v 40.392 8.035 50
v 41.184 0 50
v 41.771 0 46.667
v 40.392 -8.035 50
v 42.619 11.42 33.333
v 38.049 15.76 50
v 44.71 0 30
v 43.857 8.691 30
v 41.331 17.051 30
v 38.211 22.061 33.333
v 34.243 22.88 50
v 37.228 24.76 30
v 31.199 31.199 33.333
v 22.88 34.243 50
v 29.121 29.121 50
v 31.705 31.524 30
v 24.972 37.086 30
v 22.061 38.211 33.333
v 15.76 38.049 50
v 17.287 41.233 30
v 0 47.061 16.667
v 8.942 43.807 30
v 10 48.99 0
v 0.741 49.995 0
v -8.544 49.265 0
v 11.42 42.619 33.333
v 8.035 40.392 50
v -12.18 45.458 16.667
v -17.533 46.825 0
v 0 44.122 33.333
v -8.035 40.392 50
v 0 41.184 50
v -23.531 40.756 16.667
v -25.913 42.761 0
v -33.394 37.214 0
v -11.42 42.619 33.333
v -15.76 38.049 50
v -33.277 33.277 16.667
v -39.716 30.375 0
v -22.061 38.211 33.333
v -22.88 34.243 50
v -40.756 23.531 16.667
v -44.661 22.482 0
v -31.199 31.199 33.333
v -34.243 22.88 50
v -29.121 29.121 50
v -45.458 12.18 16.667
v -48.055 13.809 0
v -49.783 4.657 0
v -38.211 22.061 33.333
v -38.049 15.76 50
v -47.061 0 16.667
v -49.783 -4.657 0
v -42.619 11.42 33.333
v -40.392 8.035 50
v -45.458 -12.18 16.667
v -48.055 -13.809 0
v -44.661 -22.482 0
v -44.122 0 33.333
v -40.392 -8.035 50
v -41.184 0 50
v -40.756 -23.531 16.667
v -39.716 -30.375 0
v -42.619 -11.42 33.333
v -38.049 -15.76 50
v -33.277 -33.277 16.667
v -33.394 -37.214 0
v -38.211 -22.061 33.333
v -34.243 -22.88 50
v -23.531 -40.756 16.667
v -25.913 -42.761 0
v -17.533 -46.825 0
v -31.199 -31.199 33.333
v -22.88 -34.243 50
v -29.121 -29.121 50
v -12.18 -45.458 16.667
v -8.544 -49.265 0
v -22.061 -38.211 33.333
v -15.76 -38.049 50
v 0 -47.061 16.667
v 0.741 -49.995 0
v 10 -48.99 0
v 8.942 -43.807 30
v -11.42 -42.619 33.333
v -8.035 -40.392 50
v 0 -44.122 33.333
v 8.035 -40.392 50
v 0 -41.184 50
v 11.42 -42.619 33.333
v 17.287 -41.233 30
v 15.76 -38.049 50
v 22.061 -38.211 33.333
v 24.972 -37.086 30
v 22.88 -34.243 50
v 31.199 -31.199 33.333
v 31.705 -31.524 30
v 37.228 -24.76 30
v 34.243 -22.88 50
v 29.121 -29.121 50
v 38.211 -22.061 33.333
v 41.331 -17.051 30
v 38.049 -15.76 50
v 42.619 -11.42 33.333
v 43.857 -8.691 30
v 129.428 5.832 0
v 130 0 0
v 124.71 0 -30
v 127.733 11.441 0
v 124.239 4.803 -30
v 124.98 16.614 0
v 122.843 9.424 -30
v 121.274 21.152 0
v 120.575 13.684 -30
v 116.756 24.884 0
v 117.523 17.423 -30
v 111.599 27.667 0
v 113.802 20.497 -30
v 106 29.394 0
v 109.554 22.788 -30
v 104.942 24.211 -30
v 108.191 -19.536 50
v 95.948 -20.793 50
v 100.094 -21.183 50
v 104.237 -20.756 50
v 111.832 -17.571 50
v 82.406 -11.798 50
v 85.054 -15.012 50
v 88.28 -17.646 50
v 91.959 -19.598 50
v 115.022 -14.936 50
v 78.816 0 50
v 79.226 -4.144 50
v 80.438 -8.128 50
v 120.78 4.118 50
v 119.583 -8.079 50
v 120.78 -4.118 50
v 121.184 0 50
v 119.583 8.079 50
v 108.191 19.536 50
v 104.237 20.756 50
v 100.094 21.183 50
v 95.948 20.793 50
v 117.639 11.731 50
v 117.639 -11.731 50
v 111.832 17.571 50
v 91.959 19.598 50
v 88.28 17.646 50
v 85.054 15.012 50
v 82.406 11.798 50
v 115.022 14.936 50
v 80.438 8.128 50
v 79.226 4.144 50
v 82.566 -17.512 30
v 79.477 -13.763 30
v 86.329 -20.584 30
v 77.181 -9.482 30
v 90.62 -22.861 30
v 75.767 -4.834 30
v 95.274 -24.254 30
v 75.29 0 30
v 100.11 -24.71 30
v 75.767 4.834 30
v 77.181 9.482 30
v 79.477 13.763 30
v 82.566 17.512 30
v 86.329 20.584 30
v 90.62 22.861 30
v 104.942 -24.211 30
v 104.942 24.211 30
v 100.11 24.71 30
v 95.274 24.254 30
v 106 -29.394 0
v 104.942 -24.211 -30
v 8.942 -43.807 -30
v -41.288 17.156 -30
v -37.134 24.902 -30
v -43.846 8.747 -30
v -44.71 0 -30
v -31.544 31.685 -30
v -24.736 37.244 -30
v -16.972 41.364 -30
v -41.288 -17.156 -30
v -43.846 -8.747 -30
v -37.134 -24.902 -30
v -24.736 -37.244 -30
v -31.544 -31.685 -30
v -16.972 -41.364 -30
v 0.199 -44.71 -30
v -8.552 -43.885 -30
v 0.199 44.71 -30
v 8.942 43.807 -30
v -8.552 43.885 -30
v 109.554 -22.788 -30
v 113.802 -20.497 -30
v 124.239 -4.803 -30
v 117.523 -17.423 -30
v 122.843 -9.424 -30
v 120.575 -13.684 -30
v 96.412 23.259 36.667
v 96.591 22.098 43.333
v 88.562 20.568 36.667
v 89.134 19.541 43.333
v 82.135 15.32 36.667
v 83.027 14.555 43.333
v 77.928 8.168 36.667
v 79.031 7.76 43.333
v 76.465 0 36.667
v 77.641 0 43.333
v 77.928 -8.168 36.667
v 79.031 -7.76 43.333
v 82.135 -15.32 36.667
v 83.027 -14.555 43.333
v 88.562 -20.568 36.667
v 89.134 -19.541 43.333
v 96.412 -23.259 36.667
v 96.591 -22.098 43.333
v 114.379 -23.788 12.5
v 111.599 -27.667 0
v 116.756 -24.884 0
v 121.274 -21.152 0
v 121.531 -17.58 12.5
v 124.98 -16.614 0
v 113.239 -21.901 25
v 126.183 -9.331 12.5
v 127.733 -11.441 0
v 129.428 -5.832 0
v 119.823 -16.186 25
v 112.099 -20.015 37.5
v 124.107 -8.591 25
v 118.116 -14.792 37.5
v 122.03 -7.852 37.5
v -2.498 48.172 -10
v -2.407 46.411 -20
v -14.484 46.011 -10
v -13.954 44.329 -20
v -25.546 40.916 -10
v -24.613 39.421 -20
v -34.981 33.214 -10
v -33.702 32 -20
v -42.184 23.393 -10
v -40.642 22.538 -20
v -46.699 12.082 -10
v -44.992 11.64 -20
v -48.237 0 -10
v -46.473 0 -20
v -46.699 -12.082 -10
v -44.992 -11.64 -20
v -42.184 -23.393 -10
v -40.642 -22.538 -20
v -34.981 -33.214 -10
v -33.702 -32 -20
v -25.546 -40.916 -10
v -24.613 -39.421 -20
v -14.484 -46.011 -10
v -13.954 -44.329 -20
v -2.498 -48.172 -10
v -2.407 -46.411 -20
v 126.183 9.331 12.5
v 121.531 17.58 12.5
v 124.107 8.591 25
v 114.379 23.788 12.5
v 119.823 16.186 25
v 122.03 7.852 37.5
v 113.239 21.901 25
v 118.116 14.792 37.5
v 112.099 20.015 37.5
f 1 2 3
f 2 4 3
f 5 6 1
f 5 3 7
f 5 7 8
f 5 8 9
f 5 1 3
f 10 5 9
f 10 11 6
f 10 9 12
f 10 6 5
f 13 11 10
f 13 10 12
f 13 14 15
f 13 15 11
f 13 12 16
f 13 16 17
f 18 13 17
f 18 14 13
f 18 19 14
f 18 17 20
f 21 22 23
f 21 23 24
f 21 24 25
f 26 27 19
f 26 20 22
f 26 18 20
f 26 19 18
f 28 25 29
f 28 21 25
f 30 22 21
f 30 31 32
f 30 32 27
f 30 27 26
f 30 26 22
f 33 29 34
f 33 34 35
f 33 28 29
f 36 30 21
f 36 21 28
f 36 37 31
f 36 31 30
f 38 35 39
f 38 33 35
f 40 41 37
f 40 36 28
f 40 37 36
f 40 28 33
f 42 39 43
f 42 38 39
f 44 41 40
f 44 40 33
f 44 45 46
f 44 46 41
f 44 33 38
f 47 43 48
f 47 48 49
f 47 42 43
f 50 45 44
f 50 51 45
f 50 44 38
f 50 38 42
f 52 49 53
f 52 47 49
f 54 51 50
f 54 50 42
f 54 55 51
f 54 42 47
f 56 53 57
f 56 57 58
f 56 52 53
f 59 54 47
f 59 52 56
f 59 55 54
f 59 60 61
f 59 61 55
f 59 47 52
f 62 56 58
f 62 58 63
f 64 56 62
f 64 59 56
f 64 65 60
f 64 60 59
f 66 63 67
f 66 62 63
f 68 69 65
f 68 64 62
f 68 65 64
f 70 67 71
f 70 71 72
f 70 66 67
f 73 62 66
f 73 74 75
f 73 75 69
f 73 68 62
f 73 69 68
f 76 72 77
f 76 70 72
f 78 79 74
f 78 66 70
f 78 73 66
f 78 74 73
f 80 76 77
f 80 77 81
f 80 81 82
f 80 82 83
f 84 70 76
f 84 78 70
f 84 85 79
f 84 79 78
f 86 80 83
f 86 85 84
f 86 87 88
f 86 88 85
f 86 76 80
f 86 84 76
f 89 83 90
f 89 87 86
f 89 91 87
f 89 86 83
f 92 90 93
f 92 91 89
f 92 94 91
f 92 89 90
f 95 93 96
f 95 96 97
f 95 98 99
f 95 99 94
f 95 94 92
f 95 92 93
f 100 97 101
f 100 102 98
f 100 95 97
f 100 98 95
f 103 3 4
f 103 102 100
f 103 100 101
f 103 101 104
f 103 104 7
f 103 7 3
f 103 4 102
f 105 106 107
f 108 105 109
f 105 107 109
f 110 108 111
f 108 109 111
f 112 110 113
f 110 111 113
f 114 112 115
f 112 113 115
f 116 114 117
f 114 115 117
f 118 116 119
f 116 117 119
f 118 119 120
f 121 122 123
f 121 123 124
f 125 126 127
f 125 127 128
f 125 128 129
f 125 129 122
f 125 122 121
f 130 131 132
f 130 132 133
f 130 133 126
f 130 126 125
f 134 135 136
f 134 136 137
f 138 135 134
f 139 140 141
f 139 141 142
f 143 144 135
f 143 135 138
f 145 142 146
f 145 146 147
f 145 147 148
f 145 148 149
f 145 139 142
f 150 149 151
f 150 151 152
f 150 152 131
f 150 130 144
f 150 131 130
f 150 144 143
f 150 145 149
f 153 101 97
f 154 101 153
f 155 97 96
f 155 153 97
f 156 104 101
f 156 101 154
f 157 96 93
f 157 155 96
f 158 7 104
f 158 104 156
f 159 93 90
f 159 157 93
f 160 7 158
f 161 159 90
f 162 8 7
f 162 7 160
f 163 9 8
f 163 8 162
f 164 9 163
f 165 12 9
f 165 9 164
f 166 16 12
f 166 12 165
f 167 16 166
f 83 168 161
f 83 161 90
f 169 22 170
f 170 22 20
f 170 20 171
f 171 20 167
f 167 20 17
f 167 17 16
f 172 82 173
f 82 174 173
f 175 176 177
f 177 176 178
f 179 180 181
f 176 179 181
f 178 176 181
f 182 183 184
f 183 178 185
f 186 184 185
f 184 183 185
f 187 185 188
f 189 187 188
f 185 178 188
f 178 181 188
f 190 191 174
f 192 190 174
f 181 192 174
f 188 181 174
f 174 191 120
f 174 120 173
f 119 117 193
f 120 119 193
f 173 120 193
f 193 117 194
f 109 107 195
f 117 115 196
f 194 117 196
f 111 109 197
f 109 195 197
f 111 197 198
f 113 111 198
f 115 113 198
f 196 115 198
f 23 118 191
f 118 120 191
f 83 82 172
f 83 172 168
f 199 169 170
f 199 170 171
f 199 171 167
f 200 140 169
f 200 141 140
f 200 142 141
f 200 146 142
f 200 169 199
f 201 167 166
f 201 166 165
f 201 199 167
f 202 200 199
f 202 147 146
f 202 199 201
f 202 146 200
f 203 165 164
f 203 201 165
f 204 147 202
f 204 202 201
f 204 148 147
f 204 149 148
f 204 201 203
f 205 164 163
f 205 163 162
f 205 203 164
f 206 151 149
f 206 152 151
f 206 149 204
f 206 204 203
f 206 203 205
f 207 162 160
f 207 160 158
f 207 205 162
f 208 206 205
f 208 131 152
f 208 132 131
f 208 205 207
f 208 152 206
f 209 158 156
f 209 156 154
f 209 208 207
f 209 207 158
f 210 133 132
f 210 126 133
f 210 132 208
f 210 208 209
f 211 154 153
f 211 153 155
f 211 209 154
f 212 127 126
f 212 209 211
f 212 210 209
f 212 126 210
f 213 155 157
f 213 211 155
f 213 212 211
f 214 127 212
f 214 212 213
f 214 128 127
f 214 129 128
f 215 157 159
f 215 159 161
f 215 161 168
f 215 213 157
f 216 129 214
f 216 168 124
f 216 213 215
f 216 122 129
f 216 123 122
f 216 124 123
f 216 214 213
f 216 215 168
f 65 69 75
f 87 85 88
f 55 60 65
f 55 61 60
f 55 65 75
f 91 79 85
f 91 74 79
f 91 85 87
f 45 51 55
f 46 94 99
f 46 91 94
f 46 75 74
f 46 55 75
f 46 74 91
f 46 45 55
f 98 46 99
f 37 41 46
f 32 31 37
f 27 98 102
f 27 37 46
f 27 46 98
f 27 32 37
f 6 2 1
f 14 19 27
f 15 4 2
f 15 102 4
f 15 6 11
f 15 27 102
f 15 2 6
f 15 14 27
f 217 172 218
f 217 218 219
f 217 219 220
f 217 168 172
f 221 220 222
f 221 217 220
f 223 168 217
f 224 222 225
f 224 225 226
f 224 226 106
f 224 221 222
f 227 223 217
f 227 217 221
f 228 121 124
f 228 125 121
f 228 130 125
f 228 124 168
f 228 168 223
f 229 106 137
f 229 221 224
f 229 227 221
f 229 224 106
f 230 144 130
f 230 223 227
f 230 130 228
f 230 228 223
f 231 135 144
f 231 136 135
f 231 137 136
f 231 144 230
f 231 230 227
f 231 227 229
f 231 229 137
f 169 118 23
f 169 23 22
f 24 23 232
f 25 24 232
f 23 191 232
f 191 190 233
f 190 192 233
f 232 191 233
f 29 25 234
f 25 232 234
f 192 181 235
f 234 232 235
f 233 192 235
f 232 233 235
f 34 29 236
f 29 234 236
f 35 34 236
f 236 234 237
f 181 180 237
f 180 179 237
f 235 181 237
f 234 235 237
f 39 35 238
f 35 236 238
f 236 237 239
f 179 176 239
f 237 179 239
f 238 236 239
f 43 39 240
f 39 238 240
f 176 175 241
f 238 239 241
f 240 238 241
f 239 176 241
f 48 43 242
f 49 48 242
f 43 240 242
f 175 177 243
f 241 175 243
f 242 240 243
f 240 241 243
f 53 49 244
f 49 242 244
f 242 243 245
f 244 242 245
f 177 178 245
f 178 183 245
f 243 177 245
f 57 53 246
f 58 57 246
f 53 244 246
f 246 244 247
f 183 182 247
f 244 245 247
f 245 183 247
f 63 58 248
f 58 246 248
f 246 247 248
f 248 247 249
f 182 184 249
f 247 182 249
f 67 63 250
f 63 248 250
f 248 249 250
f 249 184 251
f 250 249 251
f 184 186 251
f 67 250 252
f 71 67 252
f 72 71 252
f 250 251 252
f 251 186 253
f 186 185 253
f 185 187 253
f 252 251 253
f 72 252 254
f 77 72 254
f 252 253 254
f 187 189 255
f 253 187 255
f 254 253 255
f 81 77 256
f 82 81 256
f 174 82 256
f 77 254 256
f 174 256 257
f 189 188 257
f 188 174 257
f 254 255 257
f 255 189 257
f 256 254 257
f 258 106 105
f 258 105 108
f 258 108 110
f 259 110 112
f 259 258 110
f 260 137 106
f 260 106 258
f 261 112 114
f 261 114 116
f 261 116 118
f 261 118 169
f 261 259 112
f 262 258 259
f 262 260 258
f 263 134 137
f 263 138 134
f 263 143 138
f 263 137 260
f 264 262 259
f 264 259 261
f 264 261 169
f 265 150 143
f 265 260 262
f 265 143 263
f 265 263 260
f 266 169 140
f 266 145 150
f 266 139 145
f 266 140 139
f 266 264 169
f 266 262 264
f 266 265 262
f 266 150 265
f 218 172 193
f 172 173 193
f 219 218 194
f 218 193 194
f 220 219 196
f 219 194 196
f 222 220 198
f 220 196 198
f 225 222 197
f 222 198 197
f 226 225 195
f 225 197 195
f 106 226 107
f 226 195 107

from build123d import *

# Parameters (mm, degrees)
F1_DEPTH = 50
F1_TAPER = 10
F2_DEPTH = 30
F2_TAPER = 10


with BuildPart() as f1:
    # F0 (on Top) → F1 (new body)
    with BuildSketch(Plane.XY):
        with BuildLine():
            ThreePointArc((10, -48.9897948557), (38.7298334621, -31.6227766017), (50, 0))
            ThreePointArc((50, 0), (38.7298334621, 31.6227766017), (10, 48.9897948557))
            ThreePointArc((10, 48.9897948557), (-50, 0), (10, -48.9897948557))
        make_face()
    extrude(amount=F1_DEPTH, taper=F1_TAPER)



with BuildPart() as f1b:
    # F0 (on Top) → F1, piece 2 (new body)
    with BuildSketch(Plane.XY):
        with BuildLine():
            ThreePointArc((130, 0), (123.2379000772, 18.973665961), (106, 29.3938769134))
            ThreePointArc((106, 29.3938769134), (70, 0), (106, -29.3938769134))
            ThreePointArc((106, -29.3938769134), (123.2379000772, -18.973665961), (130, 0))
        make_face()
    extrude(amount=F1_DEPTH, taper=F1_TAPER)


with BuildPart() as f1_1:
    add(f1.part)

    add(f1b.part)  # F2 merges F1b
    # F0 (on Top) → F2 (join, symmetric)
    with BuildSketch(Plane.XY):
        with BuildLine():
            ThreePointArc((10, 48.9897948557), (38.7298334621, 31.6227766017), (50, 0))
            ThreePointArc((50, 0), (38.7298334621, -31.6227766017), (10, -48.9897948557))
            Line((10, -48.9897948557), (106, -29.3938769134))
            ThreePointArc((106, -29.3938769134), (70, 0), (106, 29.3938769134))
            Line((106, 29.3938769134), (10, 48.9897948557))
        make_face()
        with BuildLine():
            ThreePointArc((10, -48.9897948557), (38.7298334621, -31.6227766017), (50, 0))
            ThreePointArc((50, 0), (38.7298334621, 31.6227766017), (10, 48.9897948557))
            ThreePointArc((10, 48.9897948557), (-50, 0), (10, -48.9897948557))
        make_face()
        with BuildLine():
            ThreePointArc((130, 0), (123.2379000772, 18.973665961), (106, 29.3938769134))
            ThreePointArc((106, 29.3938769134), (70, 0), (106, -29.3938769134))
            ThreePointArc((106, -29.3938769134), (123.2379000772, -18.973665961), (130, 0))
        make_face()
    extrude(amount=F2_DEPTH, both=True, taper=F2_TAPER)


solid = f1_1.part
